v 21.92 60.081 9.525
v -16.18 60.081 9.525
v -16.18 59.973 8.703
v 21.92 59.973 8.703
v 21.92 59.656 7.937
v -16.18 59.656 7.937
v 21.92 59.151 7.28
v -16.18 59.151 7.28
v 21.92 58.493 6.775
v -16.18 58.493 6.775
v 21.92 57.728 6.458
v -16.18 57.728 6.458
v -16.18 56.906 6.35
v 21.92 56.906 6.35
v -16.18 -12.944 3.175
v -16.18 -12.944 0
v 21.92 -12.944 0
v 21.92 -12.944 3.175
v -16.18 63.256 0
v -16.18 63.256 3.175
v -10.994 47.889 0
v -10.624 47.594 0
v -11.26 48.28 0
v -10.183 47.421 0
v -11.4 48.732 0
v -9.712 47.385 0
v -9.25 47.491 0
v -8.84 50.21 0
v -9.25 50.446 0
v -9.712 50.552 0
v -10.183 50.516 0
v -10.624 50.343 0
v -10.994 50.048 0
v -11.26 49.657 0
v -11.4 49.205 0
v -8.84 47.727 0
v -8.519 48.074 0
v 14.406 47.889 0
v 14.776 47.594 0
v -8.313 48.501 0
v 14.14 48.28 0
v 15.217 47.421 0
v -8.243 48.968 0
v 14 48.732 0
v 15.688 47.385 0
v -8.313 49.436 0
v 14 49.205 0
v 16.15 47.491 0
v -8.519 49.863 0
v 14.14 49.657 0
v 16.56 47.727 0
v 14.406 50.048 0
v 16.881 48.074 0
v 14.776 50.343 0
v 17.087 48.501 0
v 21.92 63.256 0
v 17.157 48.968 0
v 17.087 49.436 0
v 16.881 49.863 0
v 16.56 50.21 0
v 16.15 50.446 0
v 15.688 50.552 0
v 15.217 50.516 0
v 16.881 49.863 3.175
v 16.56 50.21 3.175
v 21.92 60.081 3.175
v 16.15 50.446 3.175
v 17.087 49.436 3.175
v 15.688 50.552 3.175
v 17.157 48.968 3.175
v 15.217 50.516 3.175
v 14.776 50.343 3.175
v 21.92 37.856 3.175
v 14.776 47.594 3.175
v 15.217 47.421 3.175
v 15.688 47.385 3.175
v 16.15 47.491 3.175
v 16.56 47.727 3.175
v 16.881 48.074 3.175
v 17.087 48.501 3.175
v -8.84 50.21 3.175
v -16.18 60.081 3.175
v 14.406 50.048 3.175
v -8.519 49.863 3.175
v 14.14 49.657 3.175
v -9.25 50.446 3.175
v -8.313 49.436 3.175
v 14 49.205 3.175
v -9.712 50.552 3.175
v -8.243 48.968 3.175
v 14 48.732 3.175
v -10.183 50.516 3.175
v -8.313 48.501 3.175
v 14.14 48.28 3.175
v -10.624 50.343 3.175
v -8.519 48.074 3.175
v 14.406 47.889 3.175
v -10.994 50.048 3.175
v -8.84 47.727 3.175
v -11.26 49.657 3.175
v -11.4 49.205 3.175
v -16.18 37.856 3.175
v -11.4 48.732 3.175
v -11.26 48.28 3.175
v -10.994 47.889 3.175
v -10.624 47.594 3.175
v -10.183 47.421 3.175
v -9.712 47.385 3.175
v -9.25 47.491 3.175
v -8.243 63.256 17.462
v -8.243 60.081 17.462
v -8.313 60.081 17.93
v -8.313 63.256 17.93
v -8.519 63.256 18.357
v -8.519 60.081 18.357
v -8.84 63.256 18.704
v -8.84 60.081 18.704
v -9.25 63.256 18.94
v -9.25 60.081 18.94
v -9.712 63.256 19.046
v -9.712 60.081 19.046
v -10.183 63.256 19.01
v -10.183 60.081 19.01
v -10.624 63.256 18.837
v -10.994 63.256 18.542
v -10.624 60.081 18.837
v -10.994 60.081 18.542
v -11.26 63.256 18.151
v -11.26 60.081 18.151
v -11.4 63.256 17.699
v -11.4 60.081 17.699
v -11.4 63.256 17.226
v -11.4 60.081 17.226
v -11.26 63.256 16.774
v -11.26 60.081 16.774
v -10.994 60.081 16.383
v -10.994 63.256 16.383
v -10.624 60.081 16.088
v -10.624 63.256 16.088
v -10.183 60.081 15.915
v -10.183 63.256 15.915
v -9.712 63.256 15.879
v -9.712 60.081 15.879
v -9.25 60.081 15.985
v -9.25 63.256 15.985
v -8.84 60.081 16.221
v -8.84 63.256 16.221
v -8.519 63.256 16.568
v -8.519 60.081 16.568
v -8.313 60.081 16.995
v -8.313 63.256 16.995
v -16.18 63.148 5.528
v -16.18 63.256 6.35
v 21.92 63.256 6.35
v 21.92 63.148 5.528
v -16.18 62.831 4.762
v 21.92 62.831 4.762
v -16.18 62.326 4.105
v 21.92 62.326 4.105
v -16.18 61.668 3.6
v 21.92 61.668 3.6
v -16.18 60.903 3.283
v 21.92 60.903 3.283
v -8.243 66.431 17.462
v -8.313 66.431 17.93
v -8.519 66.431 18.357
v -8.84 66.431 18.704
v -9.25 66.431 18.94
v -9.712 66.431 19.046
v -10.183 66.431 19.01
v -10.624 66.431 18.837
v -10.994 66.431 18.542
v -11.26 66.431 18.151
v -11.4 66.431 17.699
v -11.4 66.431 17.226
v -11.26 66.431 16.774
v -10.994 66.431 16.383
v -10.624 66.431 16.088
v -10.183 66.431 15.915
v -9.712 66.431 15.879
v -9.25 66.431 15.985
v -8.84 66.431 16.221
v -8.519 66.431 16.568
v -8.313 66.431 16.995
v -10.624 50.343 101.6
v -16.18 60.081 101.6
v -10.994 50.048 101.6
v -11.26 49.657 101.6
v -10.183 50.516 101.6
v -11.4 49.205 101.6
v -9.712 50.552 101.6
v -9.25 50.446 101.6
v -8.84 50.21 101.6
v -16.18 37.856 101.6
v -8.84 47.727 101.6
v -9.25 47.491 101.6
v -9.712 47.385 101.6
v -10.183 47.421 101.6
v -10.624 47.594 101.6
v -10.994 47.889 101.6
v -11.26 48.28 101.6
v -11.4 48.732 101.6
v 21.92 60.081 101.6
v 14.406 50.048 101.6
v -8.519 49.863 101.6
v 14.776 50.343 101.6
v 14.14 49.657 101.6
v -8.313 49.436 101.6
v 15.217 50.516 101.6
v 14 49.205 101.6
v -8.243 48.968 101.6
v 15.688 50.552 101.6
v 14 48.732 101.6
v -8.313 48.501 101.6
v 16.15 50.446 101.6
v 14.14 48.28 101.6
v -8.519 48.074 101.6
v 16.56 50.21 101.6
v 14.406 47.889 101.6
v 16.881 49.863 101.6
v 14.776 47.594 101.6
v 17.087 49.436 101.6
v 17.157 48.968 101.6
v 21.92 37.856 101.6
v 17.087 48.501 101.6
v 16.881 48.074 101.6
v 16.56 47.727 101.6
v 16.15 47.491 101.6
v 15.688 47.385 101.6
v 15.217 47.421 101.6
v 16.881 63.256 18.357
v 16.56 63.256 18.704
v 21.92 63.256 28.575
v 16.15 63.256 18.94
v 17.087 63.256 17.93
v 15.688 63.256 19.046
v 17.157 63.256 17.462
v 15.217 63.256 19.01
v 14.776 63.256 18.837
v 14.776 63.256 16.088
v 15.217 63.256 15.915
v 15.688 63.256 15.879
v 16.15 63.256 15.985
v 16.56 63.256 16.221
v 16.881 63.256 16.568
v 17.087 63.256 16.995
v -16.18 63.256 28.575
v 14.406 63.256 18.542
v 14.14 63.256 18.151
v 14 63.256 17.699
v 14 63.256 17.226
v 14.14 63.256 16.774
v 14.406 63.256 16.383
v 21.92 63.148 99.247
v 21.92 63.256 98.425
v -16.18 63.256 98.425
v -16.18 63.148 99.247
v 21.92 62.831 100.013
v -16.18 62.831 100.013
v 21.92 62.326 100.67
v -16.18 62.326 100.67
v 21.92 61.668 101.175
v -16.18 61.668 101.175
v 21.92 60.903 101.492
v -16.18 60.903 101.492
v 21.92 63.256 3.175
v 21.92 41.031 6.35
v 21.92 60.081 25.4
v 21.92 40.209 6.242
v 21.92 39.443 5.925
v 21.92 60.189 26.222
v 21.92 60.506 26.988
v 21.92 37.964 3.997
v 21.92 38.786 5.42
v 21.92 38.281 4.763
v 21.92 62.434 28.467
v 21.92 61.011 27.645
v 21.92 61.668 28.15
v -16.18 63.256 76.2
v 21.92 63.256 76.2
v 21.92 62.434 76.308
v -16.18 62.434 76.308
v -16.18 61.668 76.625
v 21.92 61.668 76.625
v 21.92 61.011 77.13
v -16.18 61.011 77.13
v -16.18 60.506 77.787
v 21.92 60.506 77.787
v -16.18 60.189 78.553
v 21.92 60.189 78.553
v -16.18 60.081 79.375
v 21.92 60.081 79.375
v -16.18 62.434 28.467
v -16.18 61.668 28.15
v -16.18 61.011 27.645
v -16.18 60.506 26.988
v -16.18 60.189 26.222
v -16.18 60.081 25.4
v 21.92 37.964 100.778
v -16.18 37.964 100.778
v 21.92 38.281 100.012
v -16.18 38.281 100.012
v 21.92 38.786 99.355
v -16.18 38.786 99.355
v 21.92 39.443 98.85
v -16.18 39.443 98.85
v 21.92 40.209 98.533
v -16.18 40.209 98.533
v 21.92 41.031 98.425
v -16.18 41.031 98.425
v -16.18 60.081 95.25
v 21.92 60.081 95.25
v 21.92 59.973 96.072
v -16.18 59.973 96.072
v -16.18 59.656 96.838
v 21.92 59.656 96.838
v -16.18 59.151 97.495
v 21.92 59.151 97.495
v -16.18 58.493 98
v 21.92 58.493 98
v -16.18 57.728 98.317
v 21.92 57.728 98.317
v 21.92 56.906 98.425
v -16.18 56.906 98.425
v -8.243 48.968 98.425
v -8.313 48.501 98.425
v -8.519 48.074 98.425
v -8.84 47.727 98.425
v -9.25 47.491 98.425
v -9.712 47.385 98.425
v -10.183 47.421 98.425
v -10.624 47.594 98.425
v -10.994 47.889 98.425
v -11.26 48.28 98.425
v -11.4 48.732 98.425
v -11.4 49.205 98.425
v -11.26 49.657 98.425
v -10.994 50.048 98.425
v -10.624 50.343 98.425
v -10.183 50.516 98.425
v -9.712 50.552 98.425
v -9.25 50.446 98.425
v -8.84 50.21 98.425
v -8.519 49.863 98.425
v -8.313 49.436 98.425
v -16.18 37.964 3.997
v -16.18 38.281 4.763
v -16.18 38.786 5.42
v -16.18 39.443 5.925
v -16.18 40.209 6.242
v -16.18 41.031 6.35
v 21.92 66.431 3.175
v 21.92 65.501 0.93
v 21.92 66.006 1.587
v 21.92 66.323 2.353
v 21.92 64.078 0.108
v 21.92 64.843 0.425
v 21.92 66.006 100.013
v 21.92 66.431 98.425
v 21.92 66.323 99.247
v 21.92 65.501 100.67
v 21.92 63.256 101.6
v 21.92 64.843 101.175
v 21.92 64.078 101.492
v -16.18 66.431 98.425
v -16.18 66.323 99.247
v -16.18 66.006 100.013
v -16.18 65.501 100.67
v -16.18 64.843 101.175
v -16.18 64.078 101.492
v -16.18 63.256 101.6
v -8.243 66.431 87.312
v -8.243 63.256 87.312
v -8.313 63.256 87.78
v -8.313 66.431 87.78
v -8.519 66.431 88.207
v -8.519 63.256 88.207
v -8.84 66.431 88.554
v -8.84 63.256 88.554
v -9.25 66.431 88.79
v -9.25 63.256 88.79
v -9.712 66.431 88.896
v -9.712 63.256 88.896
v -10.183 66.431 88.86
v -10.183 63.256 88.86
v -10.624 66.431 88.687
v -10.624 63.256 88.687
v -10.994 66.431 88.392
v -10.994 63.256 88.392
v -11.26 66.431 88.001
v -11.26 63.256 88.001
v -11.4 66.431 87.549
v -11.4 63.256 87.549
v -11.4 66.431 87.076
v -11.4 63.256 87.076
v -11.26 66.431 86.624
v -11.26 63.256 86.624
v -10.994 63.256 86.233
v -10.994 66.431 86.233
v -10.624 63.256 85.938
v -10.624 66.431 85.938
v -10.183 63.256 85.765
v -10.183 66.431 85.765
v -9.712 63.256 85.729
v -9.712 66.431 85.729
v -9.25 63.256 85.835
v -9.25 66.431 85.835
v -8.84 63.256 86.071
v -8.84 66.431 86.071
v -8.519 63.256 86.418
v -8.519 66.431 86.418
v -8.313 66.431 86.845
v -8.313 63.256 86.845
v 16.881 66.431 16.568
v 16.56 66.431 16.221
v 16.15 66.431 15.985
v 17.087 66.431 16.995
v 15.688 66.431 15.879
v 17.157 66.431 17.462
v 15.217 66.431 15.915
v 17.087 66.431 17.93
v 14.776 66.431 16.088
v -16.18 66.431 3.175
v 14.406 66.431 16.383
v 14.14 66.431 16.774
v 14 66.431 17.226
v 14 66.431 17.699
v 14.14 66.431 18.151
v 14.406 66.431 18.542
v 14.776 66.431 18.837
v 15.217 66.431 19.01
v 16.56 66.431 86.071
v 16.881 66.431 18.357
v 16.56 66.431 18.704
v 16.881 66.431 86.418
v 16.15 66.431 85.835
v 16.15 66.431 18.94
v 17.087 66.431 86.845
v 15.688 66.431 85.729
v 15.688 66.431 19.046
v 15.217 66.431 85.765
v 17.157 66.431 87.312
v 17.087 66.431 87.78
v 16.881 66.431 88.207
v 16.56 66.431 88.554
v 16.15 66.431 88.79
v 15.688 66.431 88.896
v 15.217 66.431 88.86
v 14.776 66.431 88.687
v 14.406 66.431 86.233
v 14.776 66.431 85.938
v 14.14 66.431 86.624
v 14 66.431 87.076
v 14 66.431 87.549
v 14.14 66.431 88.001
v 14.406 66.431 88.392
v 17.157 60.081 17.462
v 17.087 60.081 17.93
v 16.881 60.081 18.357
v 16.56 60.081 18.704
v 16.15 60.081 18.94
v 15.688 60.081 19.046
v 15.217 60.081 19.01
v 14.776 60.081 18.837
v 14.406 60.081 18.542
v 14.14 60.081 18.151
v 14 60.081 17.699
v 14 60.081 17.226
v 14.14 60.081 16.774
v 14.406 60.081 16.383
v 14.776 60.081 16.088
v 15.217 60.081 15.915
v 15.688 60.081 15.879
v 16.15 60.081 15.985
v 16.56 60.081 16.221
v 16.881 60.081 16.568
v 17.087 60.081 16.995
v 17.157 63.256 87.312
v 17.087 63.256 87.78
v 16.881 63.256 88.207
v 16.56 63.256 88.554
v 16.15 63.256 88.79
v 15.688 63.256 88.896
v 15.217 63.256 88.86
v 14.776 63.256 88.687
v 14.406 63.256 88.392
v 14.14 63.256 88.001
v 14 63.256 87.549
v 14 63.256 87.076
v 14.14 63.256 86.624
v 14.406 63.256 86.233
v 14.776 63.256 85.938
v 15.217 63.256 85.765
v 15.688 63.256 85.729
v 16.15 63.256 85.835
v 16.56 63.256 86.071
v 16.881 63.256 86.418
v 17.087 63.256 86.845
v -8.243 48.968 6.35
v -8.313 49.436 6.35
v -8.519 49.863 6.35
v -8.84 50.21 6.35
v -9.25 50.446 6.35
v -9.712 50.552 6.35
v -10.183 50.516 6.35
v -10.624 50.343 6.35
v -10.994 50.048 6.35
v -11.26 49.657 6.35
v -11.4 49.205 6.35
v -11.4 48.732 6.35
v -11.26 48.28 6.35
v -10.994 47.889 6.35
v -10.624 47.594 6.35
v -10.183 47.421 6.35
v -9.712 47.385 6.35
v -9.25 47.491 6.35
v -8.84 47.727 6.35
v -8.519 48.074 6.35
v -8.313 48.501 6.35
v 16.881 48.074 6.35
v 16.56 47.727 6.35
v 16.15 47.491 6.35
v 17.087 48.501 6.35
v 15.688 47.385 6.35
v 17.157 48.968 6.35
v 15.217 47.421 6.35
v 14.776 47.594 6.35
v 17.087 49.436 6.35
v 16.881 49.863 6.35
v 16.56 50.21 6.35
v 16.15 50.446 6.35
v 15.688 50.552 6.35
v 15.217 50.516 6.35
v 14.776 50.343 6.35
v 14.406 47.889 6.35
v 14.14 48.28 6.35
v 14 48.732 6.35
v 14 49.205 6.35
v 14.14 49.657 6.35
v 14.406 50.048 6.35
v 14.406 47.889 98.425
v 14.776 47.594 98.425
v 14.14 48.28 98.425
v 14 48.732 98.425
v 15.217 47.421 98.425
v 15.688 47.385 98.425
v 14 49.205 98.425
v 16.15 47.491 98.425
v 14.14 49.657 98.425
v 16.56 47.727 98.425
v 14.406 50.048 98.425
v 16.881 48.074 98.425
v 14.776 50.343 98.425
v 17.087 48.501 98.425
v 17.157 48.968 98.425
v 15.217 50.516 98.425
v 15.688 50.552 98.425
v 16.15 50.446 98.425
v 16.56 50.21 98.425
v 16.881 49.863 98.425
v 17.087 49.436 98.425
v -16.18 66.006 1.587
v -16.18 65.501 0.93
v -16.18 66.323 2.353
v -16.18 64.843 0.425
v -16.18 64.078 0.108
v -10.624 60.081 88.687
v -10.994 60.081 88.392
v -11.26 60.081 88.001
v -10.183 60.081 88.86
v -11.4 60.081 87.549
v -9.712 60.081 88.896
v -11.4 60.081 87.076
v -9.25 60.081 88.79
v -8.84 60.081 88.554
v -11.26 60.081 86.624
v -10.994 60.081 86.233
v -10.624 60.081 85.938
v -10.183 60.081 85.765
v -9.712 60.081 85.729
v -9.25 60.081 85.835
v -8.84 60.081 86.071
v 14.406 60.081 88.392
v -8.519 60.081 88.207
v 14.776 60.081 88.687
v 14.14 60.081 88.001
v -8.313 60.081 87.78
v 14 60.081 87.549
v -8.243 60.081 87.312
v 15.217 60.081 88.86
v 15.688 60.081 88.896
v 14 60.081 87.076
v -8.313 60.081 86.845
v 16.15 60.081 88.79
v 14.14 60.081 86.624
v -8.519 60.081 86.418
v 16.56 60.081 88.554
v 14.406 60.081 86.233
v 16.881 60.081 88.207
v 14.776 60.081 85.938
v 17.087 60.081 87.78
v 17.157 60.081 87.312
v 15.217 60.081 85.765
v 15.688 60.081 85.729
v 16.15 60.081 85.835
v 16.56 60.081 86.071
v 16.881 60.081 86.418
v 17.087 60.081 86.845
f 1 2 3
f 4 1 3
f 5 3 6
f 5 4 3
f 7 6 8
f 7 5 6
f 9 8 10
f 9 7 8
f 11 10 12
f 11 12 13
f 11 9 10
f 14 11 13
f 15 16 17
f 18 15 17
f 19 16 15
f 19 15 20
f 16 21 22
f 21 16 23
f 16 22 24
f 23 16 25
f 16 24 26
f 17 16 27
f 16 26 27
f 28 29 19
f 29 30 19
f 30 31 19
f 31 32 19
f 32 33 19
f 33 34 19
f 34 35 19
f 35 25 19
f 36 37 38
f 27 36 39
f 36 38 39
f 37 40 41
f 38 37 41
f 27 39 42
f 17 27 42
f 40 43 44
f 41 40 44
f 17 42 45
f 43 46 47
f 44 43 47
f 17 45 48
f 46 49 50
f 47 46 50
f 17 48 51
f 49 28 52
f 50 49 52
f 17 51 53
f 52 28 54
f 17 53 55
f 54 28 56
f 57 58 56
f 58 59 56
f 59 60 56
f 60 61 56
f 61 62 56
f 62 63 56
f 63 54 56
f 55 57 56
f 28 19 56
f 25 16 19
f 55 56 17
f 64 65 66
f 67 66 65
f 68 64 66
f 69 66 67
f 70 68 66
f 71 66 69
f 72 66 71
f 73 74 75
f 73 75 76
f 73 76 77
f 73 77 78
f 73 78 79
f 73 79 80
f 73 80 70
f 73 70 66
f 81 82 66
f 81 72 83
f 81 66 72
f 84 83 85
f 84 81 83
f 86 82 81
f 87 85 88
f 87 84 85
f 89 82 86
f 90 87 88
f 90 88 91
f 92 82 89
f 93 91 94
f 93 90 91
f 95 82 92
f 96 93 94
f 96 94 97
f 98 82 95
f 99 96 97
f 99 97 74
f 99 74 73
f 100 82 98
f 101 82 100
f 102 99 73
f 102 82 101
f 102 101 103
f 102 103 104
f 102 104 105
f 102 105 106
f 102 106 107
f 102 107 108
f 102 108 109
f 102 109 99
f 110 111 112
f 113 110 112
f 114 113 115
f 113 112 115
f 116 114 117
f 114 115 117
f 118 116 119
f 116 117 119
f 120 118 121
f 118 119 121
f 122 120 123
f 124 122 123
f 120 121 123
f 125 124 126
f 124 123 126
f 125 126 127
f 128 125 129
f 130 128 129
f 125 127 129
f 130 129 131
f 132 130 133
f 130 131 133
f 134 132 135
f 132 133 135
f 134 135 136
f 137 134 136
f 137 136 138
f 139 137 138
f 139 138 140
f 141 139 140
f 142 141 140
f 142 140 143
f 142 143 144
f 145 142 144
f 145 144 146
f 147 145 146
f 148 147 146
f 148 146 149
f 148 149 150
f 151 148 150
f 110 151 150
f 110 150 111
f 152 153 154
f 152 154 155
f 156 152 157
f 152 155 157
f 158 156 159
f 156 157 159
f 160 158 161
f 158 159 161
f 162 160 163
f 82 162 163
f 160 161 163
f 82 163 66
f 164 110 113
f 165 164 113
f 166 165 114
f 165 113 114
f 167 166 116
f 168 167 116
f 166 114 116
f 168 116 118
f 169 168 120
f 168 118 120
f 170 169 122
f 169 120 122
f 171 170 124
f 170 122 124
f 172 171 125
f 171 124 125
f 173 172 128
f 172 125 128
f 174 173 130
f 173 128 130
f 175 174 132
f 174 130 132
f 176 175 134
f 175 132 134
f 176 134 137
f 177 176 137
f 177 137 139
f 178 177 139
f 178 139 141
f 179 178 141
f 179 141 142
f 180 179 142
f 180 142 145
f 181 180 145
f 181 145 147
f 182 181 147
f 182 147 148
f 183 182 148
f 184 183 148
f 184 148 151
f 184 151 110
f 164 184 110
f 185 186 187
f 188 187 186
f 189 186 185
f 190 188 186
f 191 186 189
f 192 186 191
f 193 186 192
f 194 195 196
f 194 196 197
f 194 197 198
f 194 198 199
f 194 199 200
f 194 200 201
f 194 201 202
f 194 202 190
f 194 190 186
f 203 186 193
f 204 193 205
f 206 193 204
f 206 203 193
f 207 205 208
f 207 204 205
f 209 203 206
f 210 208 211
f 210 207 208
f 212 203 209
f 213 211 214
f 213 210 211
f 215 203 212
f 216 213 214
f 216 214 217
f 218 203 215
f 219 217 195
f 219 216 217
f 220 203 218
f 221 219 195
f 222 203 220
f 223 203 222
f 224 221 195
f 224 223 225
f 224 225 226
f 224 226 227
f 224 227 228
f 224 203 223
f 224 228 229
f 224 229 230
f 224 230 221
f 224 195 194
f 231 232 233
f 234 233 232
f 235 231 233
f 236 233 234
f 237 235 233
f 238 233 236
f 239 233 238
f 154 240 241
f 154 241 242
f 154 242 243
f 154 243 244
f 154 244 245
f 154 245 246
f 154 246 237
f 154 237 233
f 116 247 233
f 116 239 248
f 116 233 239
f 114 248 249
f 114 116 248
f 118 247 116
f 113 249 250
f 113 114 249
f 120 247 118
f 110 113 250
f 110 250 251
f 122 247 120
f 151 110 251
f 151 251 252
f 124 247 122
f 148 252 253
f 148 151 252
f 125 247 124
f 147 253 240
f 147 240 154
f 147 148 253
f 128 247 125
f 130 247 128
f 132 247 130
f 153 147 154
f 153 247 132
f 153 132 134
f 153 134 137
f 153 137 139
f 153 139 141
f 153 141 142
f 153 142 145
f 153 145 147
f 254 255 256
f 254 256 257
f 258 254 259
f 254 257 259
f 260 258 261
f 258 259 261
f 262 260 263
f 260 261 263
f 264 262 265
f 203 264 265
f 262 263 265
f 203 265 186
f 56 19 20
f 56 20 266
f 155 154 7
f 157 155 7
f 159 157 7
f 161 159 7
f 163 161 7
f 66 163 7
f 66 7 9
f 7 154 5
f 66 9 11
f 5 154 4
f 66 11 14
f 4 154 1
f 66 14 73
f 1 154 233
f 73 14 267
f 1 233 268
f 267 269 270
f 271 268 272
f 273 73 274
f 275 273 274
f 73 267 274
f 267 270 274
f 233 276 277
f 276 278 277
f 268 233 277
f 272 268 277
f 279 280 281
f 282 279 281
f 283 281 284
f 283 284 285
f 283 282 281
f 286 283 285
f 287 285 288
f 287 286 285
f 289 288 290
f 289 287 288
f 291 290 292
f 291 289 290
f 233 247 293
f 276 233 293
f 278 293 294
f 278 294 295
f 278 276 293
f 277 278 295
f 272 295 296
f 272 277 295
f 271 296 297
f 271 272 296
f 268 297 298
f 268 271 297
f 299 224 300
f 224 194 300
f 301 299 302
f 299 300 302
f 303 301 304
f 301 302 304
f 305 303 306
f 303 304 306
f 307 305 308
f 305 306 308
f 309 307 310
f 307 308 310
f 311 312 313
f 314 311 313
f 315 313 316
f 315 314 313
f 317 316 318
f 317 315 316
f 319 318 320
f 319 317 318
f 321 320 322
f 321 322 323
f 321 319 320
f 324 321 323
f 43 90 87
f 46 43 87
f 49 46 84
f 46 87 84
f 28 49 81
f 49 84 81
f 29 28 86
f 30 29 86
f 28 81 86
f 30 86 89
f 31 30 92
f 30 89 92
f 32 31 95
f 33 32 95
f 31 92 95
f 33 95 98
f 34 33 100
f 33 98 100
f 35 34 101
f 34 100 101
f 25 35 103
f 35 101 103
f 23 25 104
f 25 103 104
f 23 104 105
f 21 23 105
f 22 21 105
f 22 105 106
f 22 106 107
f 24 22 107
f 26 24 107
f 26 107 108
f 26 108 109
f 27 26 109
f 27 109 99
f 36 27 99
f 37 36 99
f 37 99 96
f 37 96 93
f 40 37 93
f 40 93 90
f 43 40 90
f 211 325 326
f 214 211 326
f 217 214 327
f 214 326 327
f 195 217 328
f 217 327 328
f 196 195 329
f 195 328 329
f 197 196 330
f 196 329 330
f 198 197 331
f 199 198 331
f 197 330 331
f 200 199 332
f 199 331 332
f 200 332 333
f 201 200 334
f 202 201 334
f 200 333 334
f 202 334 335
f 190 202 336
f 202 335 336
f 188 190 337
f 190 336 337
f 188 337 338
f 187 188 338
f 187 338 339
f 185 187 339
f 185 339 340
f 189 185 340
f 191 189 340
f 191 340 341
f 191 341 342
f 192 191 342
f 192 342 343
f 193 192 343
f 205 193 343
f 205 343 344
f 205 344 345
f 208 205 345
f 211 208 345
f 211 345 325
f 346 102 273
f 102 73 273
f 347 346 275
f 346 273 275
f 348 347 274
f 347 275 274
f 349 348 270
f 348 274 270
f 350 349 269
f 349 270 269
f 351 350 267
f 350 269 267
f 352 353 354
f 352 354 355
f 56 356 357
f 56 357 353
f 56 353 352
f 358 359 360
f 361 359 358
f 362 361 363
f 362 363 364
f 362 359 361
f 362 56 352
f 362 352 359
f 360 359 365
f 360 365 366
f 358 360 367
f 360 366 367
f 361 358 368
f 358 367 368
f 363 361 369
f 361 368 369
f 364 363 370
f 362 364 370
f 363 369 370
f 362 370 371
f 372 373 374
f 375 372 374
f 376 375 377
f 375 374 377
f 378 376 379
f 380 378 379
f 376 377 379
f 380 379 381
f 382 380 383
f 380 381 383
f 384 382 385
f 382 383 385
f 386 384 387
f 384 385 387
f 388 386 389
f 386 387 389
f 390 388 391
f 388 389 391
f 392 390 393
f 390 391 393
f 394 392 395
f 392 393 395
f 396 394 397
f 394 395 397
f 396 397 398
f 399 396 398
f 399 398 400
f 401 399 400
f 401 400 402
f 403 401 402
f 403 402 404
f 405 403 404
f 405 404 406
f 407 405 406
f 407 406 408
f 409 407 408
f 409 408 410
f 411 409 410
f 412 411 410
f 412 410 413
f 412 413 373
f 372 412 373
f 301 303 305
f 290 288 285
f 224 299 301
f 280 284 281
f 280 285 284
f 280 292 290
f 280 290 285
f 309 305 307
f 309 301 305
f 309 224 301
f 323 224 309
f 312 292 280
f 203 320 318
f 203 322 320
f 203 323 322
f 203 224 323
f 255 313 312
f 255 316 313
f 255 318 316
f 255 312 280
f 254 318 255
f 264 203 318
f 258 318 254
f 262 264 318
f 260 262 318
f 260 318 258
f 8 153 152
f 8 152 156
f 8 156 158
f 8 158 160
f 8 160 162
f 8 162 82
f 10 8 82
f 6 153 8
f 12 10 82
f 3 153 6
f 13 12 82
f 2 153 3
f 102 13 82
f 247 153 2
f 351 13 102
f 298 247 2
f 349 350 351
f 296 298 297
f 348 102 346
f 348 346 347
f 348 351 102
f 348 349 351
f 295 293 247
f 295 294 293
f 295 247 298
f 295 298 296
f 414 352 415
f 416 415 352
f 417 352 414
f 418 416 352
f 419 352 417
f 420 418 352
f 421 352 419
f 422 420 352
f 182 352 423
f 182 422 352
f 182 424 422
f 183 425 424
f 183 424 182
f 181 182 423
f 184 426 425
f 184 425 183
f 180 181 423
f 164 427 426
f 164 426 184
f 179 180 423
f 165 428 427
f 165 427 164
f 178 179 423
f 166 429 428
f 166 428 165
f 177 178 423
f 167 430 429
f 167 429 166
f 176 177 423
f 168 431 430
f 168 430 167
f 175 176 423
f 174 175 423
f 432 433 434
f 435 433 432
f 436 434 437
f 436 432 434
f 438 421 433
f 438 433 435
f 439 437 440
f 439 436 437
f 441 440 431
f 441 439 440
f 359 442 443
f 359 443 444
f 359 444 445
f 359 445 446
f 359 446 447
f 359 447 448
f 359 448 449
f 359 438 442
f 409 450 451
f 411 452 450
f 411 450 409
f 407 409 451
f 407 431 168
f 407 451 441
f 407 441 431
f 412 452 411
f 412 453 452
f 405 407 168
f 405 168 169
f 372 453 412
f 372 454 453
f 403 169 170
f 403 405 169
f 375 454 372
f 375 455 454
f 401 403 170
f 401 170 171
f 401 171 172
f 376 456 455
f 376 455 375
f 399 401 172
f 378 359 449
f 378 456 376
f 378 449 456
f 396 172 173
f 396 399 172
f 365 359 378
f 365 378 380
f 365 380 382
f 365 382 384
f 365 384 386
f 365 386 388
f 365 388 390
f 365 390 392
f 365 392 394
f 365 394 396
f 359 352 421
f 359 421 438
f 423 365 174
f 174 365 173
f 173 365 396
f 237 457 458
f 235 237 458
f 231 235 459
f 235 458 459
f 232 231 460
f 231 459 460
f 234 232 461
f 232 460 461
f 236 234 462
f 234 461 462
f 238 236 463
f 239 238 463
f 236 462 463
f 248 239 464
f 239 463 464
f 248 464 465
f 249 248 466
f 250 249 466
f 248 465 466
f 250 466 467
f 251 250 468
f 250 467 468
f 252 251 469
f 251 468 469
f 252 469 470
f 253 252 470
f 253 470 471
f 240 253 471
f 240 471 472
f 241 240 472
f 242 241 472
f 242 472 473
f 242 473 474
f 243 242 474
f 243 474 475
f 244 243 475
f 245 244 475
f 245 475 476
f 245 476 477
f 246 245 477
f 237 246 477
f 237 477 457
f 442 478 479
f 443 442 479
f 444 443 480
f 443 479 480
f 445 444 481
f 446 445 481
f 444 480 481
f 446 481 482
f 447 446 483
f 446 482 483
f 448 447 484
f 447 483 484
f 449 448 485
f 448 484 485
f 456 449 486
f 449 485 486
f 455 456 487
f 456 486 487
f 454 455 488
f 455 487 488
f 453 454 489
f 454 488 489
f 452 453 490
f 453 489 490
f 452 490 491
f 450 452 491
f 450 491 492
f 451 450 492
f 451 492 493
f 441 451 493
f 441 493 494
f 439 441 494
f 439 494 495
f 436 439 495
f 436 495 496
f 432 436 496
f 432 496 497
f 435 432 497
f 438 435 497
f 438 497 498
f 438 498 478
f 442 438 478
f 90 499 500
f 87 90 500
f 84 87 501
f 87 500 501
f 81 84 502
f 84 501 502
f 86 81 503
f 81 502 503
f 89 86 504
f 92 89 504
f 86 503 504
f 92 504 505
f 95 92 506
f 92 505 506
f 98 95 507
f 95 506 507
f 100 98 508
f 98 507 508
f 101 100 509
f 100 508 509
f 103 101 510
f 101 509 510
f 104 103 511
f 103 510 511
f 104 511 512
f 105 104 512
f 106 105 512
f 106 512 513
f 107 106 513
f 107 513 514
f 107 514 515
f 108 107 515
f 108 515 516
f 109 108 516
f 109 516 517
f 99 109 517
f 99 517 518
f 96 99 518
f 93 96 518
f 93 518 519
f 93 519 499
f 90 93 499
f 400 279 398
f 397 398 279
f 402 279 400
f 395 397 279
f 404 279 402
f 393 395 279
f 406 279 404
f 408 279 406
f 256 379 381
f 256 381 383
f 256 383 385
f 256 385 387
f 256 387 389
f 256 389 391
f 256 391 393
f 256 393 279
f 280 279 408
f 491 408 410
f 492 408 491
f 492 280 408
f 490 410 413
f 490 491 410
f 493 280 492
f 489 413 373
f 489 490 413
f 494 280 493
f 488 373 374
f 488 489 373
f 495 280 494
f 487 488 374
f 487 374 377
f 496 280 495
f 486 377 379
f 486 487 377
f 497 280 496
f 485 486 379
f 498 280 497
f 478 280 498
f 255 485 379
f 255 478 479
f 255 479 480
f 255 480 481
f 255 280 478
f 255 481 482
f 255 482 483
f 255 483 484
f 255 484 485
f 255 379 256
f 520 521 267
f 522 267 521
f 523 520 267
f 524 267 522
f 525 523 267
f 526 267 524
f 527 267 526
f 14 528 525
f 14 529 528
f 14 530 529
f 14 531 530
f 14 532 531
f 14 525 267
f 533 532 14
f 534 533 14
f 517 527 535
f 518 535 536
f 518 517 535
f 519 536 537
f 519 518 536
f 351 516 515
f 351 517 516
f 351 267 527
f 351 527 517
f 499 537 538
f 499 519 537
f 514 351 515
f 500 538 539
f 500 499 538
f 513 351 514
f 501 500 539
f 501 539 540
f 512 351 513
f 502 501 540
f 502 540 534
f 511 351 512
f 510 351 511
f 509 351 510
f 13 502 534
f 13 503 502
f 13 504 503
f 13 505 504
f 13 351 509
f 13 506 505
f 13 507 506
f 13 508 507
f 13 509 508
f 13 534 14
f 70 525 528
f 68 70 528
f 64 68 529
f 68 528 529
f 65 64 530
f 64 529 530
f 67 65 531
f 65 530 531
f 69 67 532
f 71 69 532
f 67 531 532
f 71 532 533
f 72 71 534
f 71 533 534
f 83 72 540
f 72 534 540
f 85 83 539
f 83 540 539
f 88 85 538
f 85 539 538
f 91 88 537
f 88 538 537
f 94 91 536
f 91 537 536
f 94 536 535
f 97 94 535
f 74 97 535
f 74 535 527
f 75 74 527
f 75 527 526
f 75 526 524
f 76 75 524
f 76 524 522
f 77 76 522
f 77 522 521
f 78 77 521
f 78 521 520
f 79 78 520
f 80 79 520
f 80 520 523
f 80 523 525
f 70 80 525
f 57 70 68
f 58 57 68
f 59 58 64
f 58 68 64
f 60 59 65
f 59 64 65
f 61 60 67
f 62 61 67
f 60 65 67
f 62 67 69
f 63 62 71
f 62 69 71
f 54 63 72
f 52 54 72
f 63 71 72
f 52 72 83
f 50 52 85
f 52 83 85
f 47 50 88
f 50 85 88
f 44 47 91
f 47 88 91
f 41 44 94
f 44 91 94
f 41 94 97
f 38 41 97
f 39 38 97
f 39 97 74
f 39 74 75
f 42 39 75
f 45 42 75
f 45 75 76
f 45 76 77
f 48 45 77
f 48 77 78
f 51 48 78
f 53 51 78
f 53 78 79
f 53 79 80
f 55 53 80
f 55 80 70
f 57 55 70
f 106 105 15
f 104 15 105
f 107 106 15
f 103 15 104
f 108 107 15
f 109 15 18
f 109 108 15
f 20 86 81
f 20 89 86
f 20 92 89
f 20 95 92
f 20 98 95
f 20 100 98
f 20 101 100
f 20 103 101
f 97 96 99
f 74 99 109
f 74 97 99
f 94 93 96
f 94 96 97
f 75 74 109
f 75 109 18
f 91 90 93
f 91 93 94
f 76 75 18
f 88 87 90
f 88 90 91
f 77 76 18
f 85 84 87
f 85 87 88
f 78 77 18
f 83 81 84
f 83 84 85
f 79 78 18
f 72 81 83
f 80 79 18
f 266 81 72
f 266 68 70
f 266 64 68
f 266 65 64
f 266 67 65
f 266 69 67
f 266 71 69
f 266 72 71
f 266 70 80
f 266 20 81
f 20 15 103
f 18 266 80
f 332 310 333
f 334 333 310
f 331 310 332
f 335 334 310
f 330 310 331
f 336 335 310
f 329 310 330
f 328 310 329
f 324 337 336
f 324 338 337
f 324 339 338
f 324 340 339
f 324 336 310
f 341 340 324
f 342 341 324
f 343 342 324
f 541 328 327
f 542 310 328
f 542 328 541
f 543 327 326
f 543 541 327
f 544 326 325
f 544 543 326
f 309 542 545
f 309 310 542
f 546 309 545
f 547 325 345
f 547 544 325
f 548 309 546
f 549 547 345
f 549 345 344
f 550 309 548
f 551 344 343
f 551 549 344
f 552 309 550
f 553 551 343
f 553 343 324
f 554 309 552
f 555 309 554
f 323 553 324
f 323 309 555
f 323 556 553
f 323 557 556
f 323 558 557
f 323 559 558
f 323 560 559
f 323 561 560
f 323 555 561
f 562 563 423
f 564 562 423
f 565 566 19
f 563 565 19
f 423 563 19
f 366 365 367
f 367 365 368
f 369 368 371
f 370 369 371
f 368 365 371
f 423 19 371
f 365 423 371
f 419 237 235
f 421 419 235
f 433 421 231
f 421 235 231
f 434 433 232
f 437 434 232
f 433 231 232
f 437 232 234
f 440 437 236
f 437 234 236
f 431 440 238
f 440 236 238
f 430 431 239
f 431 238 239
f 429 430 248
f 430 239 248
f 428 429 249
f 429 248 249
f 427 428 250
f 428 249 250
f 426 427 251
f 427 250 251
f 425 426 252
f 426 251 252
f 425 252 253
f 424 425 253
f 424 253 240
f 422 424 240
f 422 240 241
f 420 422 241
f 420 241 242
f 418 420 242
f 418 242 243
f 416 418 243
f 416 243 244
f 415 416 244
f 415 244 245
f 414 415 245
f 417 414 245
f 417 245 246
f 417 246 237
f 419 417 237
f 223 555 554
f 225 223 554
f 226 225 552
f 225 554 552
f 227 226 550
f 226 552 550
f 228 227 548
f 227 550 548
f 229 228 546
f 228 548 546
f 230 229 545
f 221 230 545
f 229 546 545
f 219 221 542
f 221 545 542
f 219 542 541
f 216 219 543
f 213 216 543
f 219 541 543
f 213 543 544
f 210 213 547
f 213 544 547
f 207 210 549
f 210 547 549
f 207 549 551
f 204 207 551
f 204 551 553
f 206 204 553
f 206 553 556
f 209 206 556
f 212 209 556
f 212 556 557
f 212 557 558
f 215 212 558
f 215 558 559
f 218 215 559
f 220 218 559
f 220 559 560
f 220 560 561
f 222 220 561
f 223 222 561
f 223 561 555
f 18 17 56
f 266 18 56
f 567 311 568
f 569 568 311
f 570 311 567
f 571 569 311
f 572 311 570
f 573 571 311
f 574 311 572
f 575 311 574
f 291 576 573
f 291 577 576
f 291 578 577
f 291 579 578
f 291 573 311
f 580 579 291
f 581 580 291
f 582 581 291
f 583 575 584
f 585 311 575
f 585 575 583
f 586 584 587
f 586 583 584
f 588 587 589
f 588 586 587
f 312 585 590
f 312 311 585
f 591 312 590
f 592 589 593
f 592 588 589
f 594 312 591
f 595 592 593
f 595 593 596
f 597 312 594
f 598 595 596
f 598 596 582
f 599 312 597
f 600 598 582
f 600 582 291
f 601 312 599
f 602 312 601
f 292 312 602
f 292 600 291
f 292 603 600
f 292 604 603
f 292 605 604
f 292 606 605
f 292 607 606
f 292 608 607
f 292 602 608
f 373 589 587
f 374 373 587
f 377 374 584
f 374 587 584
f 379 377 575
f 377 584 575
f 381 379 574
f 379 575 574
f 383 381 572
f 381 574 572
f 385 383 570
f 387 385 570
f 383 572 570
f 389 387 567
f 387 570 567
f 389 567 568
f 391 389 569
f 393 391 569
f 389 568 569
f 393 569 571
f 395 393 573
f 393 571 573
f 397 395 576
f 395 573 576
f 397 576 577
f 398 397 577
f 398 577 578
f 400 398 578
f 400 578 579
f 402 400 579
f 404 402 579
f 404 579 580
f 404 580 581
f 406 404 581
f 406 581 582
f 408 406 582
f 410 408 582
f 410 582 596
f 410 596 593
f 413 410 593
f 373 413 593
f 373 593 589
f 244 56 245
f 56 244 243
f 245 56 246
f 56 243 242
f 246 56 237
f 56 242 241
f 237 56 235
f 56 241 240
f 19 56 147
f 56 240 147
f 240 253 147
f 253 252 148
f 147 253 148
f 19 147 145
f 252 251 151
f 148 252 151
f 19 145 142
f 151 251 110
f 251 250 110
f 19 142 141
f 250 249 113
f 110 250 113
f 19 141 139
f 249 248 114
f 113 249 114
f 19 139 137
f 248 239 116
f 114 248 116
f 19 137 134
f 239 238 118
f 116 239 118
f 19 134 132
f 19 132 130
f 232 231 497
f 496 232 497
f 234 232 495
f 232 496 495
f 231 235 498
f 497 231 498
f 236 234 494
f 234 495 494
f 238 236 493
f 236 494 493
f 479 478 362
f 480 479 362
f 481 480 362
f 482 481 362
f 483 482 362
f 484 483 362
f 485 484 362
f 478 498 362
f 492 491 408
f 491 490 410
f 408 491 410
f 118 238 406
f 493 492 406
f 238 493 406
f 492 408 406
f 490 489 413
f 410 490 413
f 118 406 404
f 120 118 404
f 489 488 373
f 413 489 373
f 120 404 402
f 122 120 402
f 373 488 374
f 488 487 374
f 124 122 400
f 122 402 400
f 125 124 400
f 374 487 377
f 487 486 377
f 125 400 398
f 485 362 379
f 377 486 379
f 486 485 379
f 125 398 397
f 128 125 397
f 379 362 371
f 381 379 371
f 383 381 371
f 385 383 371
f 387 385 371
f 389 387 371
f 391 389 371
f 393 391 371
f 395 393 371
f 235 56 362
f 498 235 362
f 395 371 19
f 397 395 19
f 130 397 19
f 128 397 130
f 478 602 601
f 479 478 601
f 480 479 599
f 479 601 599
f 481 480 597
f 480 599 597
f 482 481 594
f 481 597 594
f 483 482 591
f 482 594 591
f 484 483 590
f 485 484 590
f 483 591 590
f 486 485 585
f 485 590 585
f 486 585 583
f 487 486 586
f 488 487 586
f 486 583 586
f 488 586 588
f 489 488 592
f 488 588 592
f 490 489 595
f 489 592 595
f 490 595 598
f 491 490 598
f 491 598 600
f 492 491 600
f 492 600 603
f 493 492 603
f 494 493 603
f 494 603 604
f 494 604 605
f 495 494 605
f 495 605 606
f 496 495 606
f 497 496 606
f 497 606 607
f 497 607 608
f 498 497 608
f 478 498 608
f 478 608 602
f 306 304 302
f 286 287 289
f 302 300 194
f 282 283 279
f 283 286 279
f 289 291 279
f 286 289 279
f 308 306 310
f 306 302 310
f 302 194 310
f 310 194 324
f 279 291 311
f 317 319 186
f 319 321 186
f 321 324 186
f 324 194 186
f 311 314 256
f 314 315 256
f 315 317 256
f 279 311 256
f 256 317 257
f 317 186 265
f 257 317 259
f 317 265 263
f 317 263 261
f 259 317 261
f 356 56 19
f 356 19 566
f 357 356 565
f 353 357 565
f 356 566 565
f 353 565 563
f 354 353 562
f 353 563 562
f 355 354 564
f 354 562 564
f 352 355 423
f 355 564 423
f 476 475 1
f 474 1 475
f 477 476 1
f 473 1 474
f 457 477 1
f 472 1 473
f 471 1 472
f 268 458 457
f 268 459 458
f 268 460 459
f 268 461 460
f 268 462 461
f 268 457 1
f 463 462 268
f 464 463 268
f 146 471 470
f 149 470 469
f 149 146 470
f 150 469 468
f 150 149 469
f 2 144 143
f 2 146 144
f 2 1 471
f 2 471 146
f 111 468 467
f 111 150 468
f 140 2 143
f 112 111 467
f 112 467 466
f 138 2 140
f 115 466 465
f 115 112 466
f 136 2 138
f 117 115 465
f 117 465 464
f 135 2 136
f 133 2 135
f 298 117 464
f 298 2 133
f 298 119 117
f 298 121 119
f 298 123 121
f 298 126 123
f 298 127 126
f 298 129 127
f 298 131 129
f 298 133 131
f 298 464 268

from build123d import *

# Parameters (mm, degrees)
F0_W      = 38.1
F0_H      = 76.2
F1_DEPTH  = 3.175
F3_DEPTH  = 38.1
F4_R      = 1.5875
F5_DEPTH  = 25.4
F6_W      = 38.1
F6_H      = 101.6
F7_DEPTH  = 3.175
F8_R      = 1.5875
F9_DEPTH  = 25.4
F10_R     = 3.17499
F12_DEPTH = 38.1
F13_R     = 1.5875
F15_DEPTH = 25.4
F14_R     = 1.5875
F16_DEPTH = 25.4
F17_R     = 3.17499
F17_2_R   = 3.17499
F18_R     = 3.17499


# Not quite as in the source:
# - a fillet or chamfer is up to 0.001 mm smaller than in the source, because OpenCascade refuses the exact size


with BuildPart() as f1:
    # F0 (on Top) → F1 (new body)
    with BuildSketch(Plane.XY):
        with Locations((2.8697997332, 25.1559876483)):
            Rectangle(F0_W, F0_H)
    extrude(amount=F1_DEPTH)


with BuildPart() as f3:
    # F2 (on face) → F3 (new body)
    with BuildSketch(Plane(origin=(-16.1802002668, 0, 0), x_dir=(0, -1, 0), z_dir=(-1, 0, 0))):
        Polygon((-63.2559876483, 28.575), (-63.2559876483, 3.175), (-37.8559876483, 3.175), (-37.8559876483, 6.35), (-60.0809876483, 6.35), (-60.0809876483, 28.575), align=None)
    extrude(amount=-F3_DEPTH)


with BuildPart() as f5_tool:
    # F4 (on face) → F5 (new body)
    with BuildSketch(Plane.XY.offset(6.35)):
        with Locations((-9.8302002668, 48.9684876483)):
            Circle(F4_R)
        with Locations((15.5697997332, 48.9684876483)):
            Circle(F4_R)
    extrude(amount=-F5_DEPTH)


with BuildPart() as f1_1:
    add(f1.part)

    # F5: cut by f5_tool
    add(f5_tool.part, mode=Mode.SUBTRACT)


with BuildPart() as f3_1:
    add(f3.part)

    # F5: cut by f5_tool
    add(f5_tool.part, mode=Mode.SUBTRACT)


with BuildPart() as f7:
    # F6 (on face) → F7 (new body)
    with BuildSketch(Plane(origin=(0, 63.2559876483, 0), x_dir=(-1, 0, 0), z_dir=(0, 1, 0))):
        with Locations((-2.8697997332, 50.8)):
            Rectangle(F6_W, F6_H)
    extrude(amount=F7_DEPTH)


with BuildPart() as f9_tool:
    # F8 (on face) → F9 (new body)
    with BuildSketch(Plane.XZ.offset(-60.0809876483)):
        with Locations((-9.8302002668, 17.4625)):
            Circle(F8_R)
        with Locations((15.5697997332, 17.4625)):
            Circle(F8_R)
    extrude(amount=-F9_DEPTH)


with BuildPart() as f3_2:
    add(f3_1.part)

    # F9: cut by f9_tool
    add(f9_tool.part, mode=Mode.SUBTRACT)

    # F17#2 (radius 3.175 in the source; OpenCascade refuses exactly that, so slightly less here)
    f17_2_edges = [f3_2.edges().sort_by_distance(p)[0] for p in [
        (2.8698, 60.080988, 28.575),
        (2.8698, 37.855988, 6.35),
        (2.8698, 60.080988, 6.35),
        (2.8698, 63.255988, 3.175),
    ]]
    fillet(f17_2_edges, radius=F17_2_R)


with BuildPart() as f7_1:
    add(f7.part)

    # F9: cut by f9_tool
    add(f9_tool.part, mode=Mode.SUBTRACT)

    # F10 (radius 3.175 in the source; OpenCascade refuses exactly that, so slightly less here)
    f10_edges = [f7_1.edges().sort_by_distance(p)[0] for p in [
        (2.8698, 66.430988, 0),
    ]]
    fillet(f10_edges, radius=F10_R)


with BuildPart() as f12:
    # F11 (on face) → F12 (new body)
    with BuildSketch(Plane.YZ.offset(21.9197997332)):
        Polygon((63.2559876483, 76.2), (63.2559876483, 101.6), (37.8559876483, 101.6), (37.8559876483, 98.425), (60.0809876483, 98.425), (60.0809876483, 76.2), align=None)
    extrude(amount=-F12_DEPTH)


with BuildPart() as f15_tool:
    # F13 (on face) → F15 (new body)
    with BuildSketch(Plane.XZ.offset(-60.0809876483)):
        with Locations((-9.8302002668, 87.3125)):
            Circle(F13_R)
        with Locations((15.5697997332, 87.3125)):
            Circle(F13_R)
    extrude(amount=-F15_DEPTH)


with BuildPart() as f7_2:
    add(f7_1.part)

    # F15: cut by f15_tool
    add(f15_tool.part, mode=Mode.SUBTRACT)

    # F18 (radius 3.175 in the source; OpenCascade refuses exactly that, so slightly less here)
    f18_edges = [f7_2.edges().sort_by_distance(p)[0] for p in [
        (2.8698, 66.430988, 101.6),
    ]]
    fillet(f18_edges, radius=F18_R)


with BuildPart() as f12_1:
    add(f12.part)

    # F15: cut by f15_tool
    add(f15_tool.part, mode=Mode.SUBTRACT)

    # F14 (on face) → F16 (cut)
    with BuildSketch(Plane(origin=(0, 0, 98.425), x_dir=(1, 0, 0), z_dir=(0, 0, -1))):
        with Locations((-9.8302002668, -48.9684876483)):
            Circle(F14_R)
        with Locations((15.5697997332, -48.9684876483)):
            Circle(F14_R)
    extrude(amount=-F16_DEPTH, mode=Mode.SUBTRACT)

    # F17 (radius 3.175 in the source; OpenCascade refuses exactly that, so slightly less here)
    f17_edges = [f12_1.edges().sort_by_distance(p)[0] for p in [
        (2.8698, 60.080988, 98.425),
        (2.8698, 60.080988, 76.2),
        (2.8698, 63.255988, 101.6),
        (2.8698, 37.855988, 98.425),
    ]]
    fillet(f17_edges, radius=F17_R)


solid = Compound([f1_1.part, f3_2.part, f7_2.part, f12_1.part])
